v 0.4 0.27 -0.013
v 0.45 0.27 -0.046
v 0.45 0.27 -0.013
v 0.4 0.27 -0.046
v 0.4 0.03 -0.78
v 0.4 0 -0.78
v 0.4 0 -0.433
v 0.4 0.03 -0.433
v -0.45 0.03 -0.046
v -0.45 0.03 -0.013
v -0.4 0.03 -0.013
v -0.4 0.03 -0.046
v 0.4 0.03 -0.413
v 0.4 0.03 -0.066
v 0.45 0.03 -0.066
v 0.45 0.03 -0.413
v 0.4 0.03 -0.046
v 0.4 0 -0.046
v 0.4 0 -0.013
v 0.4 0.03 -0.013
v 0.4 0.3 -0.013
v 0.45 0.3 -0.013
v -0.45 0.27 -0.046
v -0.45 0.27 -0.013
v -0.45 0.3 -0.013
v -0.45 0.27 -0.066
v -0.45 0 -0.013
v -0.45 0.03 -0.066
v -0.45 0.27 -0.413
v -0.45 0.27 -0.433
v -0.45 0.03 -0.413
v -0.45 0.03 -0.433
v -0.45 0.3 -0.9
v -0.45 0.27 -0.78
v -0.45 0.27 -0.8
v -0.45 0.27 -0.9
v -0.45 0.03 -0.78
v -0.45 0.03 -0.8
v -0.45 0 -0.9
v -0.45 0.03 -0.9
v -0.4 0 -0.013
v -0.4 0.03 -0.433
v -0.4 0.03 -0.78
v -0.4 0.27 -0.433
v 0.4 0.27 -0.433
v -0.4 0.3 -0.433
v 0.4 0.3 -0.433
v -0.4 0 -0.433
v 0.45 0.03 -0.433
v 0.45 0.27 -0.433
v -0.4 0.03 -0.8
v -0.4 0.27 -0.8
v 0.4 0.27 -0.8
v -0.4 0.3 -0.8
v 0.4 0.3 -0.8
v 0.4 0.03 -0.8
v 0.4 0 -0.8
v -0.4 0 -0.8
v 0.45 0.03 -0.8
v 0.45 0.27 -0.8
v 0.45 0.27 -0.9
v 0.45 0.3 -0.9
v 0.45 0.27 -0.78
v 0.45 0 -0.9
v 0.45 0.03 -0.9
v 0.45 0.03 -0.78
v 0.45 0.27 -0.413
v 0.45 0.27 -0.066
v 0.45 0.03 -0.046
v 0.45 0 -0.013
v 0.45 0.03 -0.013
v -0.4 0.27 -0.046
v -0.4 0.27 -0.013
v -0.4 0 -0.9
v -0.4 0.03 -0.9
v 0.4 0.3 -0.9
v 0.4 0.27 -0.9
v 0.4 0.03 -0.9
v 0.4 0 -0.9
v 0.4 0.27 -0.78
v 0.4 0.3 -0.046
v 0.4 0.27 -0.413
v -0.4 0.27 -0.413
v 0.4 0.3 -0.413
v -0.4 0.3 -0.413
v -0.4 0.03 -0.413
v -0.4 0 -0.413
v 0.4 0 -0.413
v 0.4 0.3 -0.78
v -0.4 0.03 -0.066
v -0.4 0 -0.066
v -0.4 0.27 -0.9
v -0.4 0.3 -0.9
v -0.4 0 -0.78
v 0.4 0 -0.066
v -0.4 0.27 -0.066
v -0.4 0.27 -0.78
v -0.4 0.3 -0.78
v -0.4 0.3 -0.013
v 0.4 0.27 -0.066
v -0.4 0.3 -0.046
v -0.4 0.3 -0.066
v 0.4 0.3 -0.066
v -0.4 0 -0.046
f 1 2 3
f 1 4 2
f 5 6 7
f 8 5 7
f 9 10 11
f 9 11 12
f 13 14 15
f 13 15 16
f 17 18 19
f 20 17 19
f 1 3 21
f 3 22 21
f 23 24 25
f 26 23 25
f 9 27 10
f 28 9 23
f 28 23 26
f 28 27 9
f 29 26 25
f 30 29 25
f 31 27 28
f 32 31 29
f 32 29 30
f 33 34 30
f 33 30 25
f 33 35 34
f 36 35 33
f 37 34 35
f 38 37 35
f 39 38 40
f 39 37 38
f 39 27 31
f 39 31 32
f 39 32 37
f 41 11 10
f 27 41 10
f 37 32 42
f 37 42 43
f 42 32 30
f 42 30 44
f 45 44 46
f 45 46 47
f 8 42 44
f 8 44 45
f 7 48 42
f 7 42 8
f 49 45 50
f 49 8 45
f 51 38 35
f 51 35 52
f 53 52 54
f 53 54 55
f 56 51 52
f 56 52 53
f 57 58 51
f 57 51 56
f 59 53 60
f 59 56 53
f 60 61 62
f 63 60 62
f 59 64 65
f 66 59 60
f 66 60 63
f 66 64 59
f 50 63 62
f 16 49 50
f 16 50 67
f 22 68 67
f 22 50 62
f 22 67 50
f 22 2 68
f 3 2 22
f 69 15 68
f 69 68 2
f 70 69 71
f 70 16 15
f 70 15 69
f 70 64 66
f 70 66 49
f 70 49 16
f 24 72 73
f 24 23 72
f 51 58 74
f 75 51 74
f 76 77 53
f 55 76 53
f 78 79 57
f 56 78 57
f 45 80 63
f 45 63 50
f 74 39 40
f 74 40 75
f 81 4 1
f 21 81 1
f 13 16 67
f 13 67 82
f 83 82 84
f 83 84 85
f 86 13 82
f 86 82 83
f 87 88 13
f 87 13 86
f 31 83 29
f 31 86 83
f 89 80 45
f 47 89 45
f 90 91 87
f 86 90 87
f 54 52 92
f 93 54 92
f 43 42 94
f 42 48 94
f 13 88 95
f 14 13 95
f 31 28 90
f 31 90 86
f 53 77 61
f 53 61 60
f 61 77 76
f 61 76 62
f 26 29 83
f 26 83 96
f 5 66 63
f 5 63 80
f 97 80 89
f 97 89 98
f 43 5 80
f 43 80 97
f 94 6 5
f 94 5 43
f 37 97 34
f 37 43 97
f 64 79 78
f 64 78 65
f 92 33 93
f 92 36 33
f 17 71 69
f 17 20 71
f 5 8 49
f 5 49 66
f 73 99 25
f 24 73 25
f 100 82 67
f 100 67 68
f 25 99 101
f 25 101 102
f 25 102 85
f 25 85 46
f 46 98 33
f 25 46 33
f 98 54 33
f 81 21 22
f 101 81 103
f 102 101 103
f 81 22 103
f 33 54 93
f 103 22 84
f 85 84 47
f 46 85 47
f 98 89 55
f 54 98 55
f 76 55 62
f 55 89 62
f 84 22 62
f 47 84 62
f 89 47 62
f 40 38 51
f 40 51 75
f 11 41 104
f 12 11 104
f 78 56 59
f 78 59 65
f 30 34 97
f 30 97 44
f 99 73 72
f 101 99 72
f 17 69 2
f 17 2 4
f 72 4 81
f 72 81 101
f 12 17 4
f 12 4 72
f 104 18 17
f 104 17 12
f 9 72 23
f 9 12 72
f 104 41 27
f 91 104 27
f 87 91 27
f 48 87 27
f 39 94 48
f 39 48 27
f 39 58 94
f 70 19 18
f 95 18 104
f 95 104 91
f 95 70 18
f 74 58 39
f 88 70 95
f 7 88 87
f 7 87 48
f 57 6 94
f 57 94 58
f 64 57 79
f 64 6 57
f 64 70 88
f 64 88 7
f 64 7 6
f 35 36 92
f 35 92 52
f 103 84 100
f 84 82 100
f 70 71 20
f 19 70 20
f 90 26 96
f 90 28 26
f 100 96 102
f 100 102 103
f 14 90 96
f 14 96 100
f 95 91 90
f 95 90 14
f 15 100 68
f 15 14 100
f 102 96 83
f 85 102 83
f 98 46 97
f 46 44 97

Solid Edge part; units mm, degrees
sketch "Sketch1" plane through (0, 0, 0) normal (0, -1, 0) x (1, 0, 0)
  line L0 (-0.4, 0.6679) -> (0.4, 0.6679)
  line L1 (0.4, 0.3209) -> (0.4, 0.6679)
  line L2 (0.4, 0.3209) -> (-0.4, 0.3209)
  line L3 (-0.4, 0.6679) -> (-0.4, 0.3209)
  line L4 (-0.4, 0.3009) -> (0.4, 0.3009)
  line L5 (0.4, -0.046) -> (0.4, 0.3009)
  line L6 (0.4, -0.046) -> (-0.4, -0.046)
  line L7 (-0.4, 0.3009) -> (-0.4, -0.046)
  line L8 (-0.4, -0.066) -> (0.4, -0.066)
  line L9 (0.4, -0.413) -> (0.4, -0.066)
  line L10 (0.4, -0.413) -> (-0.4, -0.413)
  line L11 (-0.4, -0.066) -> (-0.4, -0.413)
  line L12 (-0.4, -0.433) -> (0.4, -0.433)
  line L13 (0.4, -0.78) -> (0.4, -0.433)
  line L14 (0.4, -0.78) -> (-0.4, -0.78)
  line L15 (-0.4, -0.433) -> (-0.4, -0.78)
  line L16 (0.4, -0.9) -> (0.45, -0.9)
  line L17 (0.45, -0.9) -> (0.45, 0.9)
  line L18 (0.45, 0.9) -> (0.4, 0.9)
  line L19 (0.4, 0.6879) -> (0.4, 0.9)
  line L20 (0.4, 0.6879) -> (-0.4, 0.6879)
  line L21 (-0.4, 0.9) -> (-0.4, 0.6879)
  line L22 (-0.4, 0.9) -> (-0.45, 0.9)
  line L23 (-0.45, 0.9) -> (-0.45, -0.9)
  line L24 (-0.45, -0.9) -> (-0.4, -0.9)
  line L25 (-0.4, -0.8) -> (-0.4, -0.9)
  line L26 (-0.4, -0.8) -> (0.4, -0.8)
  line L27 (0.4, -0.9) -> (0.4, -0.8)
  dimension "D1" = 0.05
  dimension "D2" = 1.8
  dimension "D3" = 0.9
  dimension "D4" = 0.02
  dimension "D5" = 0.347
  dimension "D6" = 0.1
extrude "Protrusion1" add sketch "Sketch1" against normal blind 0.3
sketch "Sketch2" plane through (-0.45, 0.15, 0) normal (-1, 0, 0) x (0, 0, -1)
  line L0 (-0.6679, -0.12) -> (-0.6679, 0.12)
  line L1 (-0.6679, 0.12) -> (-0.3209, 0.12)
  line L2 (-0.3209, -0.12) -> (-0.3209, 0.12)
  line L3 (-0.3209, -0.12) -> (-0.6679, -0.12)
  line L4 (-0.3009, -0.12) -> (-0.3009, 0.12)
  line L5 (-0.3009, 0.12) -> (0.046, 0.12)
  line L6 (0.046, -0.12) -> (0.046, 0.12)
  line L7 (0.046, -0.12) -> (-0.3009, -0.12)
  line L8 (0.066, -0.12) -> (0.066, 0.12)
  line L9 (0.066, 0.12) -> (0.413, 0.12)
  line L10 (0.413, -0.12) -> (0.413, 0.12)
  line L11 (0.413, -0.12) -> (0.066, -0.12)
  line L12 (0.433, -0.12) -> (0.433, 0.12)
  line L13 (0.433, 0.12) -> (0.78, 0.12)
  line L14 (0.78, -0.12) -> (0.78, 0.12)
  line L15 (0.78, -0.12) -> (0.433, -0.12)
  line L16 (0.8, -0.12) -> (0.8, 0.12)
  line L17 (0.8, 0.12) -> (0.9, 0.12)
  line L18 (0.9, -0.12) -> (0.9, 0.12)
  line L19 (0.9, -0.12) -> (0.8, -0.12)
  line L20 (-0.6879, -0.12) -> (-0.6879, 0.12)
  line L21 (-0.9, 0.12) -> (-0.6879, 0.12)
  line L22 (-0.9, -0.12) -> (-0.9, 0.12)
  line L23 (-0.6879, -0.12) -> (-0.9, -0.12)
  dimension "D1" = 0.03
extrude "Cutout1" cut sketch "Sketch2" against normal through all
sketch "Sketch3" plane through (0, 0.3, 0) normal (0, 1, 0) x (-1, 0, 0)
  line L0 (-0.6667, -0.013) -> (0.6786, -0.013)
  line L1 (0.6786, -0.013) -> (0.6786, 1)
  line L2 (0.6786, 1) -> (-0.6667, 1)
  line L3 (-0.6667, 1) -> (-0.6667, -0.013)
  dimension "D1" = 0.033
extrude "Cutout2" cut sketch "Sketch3" against normal through all
